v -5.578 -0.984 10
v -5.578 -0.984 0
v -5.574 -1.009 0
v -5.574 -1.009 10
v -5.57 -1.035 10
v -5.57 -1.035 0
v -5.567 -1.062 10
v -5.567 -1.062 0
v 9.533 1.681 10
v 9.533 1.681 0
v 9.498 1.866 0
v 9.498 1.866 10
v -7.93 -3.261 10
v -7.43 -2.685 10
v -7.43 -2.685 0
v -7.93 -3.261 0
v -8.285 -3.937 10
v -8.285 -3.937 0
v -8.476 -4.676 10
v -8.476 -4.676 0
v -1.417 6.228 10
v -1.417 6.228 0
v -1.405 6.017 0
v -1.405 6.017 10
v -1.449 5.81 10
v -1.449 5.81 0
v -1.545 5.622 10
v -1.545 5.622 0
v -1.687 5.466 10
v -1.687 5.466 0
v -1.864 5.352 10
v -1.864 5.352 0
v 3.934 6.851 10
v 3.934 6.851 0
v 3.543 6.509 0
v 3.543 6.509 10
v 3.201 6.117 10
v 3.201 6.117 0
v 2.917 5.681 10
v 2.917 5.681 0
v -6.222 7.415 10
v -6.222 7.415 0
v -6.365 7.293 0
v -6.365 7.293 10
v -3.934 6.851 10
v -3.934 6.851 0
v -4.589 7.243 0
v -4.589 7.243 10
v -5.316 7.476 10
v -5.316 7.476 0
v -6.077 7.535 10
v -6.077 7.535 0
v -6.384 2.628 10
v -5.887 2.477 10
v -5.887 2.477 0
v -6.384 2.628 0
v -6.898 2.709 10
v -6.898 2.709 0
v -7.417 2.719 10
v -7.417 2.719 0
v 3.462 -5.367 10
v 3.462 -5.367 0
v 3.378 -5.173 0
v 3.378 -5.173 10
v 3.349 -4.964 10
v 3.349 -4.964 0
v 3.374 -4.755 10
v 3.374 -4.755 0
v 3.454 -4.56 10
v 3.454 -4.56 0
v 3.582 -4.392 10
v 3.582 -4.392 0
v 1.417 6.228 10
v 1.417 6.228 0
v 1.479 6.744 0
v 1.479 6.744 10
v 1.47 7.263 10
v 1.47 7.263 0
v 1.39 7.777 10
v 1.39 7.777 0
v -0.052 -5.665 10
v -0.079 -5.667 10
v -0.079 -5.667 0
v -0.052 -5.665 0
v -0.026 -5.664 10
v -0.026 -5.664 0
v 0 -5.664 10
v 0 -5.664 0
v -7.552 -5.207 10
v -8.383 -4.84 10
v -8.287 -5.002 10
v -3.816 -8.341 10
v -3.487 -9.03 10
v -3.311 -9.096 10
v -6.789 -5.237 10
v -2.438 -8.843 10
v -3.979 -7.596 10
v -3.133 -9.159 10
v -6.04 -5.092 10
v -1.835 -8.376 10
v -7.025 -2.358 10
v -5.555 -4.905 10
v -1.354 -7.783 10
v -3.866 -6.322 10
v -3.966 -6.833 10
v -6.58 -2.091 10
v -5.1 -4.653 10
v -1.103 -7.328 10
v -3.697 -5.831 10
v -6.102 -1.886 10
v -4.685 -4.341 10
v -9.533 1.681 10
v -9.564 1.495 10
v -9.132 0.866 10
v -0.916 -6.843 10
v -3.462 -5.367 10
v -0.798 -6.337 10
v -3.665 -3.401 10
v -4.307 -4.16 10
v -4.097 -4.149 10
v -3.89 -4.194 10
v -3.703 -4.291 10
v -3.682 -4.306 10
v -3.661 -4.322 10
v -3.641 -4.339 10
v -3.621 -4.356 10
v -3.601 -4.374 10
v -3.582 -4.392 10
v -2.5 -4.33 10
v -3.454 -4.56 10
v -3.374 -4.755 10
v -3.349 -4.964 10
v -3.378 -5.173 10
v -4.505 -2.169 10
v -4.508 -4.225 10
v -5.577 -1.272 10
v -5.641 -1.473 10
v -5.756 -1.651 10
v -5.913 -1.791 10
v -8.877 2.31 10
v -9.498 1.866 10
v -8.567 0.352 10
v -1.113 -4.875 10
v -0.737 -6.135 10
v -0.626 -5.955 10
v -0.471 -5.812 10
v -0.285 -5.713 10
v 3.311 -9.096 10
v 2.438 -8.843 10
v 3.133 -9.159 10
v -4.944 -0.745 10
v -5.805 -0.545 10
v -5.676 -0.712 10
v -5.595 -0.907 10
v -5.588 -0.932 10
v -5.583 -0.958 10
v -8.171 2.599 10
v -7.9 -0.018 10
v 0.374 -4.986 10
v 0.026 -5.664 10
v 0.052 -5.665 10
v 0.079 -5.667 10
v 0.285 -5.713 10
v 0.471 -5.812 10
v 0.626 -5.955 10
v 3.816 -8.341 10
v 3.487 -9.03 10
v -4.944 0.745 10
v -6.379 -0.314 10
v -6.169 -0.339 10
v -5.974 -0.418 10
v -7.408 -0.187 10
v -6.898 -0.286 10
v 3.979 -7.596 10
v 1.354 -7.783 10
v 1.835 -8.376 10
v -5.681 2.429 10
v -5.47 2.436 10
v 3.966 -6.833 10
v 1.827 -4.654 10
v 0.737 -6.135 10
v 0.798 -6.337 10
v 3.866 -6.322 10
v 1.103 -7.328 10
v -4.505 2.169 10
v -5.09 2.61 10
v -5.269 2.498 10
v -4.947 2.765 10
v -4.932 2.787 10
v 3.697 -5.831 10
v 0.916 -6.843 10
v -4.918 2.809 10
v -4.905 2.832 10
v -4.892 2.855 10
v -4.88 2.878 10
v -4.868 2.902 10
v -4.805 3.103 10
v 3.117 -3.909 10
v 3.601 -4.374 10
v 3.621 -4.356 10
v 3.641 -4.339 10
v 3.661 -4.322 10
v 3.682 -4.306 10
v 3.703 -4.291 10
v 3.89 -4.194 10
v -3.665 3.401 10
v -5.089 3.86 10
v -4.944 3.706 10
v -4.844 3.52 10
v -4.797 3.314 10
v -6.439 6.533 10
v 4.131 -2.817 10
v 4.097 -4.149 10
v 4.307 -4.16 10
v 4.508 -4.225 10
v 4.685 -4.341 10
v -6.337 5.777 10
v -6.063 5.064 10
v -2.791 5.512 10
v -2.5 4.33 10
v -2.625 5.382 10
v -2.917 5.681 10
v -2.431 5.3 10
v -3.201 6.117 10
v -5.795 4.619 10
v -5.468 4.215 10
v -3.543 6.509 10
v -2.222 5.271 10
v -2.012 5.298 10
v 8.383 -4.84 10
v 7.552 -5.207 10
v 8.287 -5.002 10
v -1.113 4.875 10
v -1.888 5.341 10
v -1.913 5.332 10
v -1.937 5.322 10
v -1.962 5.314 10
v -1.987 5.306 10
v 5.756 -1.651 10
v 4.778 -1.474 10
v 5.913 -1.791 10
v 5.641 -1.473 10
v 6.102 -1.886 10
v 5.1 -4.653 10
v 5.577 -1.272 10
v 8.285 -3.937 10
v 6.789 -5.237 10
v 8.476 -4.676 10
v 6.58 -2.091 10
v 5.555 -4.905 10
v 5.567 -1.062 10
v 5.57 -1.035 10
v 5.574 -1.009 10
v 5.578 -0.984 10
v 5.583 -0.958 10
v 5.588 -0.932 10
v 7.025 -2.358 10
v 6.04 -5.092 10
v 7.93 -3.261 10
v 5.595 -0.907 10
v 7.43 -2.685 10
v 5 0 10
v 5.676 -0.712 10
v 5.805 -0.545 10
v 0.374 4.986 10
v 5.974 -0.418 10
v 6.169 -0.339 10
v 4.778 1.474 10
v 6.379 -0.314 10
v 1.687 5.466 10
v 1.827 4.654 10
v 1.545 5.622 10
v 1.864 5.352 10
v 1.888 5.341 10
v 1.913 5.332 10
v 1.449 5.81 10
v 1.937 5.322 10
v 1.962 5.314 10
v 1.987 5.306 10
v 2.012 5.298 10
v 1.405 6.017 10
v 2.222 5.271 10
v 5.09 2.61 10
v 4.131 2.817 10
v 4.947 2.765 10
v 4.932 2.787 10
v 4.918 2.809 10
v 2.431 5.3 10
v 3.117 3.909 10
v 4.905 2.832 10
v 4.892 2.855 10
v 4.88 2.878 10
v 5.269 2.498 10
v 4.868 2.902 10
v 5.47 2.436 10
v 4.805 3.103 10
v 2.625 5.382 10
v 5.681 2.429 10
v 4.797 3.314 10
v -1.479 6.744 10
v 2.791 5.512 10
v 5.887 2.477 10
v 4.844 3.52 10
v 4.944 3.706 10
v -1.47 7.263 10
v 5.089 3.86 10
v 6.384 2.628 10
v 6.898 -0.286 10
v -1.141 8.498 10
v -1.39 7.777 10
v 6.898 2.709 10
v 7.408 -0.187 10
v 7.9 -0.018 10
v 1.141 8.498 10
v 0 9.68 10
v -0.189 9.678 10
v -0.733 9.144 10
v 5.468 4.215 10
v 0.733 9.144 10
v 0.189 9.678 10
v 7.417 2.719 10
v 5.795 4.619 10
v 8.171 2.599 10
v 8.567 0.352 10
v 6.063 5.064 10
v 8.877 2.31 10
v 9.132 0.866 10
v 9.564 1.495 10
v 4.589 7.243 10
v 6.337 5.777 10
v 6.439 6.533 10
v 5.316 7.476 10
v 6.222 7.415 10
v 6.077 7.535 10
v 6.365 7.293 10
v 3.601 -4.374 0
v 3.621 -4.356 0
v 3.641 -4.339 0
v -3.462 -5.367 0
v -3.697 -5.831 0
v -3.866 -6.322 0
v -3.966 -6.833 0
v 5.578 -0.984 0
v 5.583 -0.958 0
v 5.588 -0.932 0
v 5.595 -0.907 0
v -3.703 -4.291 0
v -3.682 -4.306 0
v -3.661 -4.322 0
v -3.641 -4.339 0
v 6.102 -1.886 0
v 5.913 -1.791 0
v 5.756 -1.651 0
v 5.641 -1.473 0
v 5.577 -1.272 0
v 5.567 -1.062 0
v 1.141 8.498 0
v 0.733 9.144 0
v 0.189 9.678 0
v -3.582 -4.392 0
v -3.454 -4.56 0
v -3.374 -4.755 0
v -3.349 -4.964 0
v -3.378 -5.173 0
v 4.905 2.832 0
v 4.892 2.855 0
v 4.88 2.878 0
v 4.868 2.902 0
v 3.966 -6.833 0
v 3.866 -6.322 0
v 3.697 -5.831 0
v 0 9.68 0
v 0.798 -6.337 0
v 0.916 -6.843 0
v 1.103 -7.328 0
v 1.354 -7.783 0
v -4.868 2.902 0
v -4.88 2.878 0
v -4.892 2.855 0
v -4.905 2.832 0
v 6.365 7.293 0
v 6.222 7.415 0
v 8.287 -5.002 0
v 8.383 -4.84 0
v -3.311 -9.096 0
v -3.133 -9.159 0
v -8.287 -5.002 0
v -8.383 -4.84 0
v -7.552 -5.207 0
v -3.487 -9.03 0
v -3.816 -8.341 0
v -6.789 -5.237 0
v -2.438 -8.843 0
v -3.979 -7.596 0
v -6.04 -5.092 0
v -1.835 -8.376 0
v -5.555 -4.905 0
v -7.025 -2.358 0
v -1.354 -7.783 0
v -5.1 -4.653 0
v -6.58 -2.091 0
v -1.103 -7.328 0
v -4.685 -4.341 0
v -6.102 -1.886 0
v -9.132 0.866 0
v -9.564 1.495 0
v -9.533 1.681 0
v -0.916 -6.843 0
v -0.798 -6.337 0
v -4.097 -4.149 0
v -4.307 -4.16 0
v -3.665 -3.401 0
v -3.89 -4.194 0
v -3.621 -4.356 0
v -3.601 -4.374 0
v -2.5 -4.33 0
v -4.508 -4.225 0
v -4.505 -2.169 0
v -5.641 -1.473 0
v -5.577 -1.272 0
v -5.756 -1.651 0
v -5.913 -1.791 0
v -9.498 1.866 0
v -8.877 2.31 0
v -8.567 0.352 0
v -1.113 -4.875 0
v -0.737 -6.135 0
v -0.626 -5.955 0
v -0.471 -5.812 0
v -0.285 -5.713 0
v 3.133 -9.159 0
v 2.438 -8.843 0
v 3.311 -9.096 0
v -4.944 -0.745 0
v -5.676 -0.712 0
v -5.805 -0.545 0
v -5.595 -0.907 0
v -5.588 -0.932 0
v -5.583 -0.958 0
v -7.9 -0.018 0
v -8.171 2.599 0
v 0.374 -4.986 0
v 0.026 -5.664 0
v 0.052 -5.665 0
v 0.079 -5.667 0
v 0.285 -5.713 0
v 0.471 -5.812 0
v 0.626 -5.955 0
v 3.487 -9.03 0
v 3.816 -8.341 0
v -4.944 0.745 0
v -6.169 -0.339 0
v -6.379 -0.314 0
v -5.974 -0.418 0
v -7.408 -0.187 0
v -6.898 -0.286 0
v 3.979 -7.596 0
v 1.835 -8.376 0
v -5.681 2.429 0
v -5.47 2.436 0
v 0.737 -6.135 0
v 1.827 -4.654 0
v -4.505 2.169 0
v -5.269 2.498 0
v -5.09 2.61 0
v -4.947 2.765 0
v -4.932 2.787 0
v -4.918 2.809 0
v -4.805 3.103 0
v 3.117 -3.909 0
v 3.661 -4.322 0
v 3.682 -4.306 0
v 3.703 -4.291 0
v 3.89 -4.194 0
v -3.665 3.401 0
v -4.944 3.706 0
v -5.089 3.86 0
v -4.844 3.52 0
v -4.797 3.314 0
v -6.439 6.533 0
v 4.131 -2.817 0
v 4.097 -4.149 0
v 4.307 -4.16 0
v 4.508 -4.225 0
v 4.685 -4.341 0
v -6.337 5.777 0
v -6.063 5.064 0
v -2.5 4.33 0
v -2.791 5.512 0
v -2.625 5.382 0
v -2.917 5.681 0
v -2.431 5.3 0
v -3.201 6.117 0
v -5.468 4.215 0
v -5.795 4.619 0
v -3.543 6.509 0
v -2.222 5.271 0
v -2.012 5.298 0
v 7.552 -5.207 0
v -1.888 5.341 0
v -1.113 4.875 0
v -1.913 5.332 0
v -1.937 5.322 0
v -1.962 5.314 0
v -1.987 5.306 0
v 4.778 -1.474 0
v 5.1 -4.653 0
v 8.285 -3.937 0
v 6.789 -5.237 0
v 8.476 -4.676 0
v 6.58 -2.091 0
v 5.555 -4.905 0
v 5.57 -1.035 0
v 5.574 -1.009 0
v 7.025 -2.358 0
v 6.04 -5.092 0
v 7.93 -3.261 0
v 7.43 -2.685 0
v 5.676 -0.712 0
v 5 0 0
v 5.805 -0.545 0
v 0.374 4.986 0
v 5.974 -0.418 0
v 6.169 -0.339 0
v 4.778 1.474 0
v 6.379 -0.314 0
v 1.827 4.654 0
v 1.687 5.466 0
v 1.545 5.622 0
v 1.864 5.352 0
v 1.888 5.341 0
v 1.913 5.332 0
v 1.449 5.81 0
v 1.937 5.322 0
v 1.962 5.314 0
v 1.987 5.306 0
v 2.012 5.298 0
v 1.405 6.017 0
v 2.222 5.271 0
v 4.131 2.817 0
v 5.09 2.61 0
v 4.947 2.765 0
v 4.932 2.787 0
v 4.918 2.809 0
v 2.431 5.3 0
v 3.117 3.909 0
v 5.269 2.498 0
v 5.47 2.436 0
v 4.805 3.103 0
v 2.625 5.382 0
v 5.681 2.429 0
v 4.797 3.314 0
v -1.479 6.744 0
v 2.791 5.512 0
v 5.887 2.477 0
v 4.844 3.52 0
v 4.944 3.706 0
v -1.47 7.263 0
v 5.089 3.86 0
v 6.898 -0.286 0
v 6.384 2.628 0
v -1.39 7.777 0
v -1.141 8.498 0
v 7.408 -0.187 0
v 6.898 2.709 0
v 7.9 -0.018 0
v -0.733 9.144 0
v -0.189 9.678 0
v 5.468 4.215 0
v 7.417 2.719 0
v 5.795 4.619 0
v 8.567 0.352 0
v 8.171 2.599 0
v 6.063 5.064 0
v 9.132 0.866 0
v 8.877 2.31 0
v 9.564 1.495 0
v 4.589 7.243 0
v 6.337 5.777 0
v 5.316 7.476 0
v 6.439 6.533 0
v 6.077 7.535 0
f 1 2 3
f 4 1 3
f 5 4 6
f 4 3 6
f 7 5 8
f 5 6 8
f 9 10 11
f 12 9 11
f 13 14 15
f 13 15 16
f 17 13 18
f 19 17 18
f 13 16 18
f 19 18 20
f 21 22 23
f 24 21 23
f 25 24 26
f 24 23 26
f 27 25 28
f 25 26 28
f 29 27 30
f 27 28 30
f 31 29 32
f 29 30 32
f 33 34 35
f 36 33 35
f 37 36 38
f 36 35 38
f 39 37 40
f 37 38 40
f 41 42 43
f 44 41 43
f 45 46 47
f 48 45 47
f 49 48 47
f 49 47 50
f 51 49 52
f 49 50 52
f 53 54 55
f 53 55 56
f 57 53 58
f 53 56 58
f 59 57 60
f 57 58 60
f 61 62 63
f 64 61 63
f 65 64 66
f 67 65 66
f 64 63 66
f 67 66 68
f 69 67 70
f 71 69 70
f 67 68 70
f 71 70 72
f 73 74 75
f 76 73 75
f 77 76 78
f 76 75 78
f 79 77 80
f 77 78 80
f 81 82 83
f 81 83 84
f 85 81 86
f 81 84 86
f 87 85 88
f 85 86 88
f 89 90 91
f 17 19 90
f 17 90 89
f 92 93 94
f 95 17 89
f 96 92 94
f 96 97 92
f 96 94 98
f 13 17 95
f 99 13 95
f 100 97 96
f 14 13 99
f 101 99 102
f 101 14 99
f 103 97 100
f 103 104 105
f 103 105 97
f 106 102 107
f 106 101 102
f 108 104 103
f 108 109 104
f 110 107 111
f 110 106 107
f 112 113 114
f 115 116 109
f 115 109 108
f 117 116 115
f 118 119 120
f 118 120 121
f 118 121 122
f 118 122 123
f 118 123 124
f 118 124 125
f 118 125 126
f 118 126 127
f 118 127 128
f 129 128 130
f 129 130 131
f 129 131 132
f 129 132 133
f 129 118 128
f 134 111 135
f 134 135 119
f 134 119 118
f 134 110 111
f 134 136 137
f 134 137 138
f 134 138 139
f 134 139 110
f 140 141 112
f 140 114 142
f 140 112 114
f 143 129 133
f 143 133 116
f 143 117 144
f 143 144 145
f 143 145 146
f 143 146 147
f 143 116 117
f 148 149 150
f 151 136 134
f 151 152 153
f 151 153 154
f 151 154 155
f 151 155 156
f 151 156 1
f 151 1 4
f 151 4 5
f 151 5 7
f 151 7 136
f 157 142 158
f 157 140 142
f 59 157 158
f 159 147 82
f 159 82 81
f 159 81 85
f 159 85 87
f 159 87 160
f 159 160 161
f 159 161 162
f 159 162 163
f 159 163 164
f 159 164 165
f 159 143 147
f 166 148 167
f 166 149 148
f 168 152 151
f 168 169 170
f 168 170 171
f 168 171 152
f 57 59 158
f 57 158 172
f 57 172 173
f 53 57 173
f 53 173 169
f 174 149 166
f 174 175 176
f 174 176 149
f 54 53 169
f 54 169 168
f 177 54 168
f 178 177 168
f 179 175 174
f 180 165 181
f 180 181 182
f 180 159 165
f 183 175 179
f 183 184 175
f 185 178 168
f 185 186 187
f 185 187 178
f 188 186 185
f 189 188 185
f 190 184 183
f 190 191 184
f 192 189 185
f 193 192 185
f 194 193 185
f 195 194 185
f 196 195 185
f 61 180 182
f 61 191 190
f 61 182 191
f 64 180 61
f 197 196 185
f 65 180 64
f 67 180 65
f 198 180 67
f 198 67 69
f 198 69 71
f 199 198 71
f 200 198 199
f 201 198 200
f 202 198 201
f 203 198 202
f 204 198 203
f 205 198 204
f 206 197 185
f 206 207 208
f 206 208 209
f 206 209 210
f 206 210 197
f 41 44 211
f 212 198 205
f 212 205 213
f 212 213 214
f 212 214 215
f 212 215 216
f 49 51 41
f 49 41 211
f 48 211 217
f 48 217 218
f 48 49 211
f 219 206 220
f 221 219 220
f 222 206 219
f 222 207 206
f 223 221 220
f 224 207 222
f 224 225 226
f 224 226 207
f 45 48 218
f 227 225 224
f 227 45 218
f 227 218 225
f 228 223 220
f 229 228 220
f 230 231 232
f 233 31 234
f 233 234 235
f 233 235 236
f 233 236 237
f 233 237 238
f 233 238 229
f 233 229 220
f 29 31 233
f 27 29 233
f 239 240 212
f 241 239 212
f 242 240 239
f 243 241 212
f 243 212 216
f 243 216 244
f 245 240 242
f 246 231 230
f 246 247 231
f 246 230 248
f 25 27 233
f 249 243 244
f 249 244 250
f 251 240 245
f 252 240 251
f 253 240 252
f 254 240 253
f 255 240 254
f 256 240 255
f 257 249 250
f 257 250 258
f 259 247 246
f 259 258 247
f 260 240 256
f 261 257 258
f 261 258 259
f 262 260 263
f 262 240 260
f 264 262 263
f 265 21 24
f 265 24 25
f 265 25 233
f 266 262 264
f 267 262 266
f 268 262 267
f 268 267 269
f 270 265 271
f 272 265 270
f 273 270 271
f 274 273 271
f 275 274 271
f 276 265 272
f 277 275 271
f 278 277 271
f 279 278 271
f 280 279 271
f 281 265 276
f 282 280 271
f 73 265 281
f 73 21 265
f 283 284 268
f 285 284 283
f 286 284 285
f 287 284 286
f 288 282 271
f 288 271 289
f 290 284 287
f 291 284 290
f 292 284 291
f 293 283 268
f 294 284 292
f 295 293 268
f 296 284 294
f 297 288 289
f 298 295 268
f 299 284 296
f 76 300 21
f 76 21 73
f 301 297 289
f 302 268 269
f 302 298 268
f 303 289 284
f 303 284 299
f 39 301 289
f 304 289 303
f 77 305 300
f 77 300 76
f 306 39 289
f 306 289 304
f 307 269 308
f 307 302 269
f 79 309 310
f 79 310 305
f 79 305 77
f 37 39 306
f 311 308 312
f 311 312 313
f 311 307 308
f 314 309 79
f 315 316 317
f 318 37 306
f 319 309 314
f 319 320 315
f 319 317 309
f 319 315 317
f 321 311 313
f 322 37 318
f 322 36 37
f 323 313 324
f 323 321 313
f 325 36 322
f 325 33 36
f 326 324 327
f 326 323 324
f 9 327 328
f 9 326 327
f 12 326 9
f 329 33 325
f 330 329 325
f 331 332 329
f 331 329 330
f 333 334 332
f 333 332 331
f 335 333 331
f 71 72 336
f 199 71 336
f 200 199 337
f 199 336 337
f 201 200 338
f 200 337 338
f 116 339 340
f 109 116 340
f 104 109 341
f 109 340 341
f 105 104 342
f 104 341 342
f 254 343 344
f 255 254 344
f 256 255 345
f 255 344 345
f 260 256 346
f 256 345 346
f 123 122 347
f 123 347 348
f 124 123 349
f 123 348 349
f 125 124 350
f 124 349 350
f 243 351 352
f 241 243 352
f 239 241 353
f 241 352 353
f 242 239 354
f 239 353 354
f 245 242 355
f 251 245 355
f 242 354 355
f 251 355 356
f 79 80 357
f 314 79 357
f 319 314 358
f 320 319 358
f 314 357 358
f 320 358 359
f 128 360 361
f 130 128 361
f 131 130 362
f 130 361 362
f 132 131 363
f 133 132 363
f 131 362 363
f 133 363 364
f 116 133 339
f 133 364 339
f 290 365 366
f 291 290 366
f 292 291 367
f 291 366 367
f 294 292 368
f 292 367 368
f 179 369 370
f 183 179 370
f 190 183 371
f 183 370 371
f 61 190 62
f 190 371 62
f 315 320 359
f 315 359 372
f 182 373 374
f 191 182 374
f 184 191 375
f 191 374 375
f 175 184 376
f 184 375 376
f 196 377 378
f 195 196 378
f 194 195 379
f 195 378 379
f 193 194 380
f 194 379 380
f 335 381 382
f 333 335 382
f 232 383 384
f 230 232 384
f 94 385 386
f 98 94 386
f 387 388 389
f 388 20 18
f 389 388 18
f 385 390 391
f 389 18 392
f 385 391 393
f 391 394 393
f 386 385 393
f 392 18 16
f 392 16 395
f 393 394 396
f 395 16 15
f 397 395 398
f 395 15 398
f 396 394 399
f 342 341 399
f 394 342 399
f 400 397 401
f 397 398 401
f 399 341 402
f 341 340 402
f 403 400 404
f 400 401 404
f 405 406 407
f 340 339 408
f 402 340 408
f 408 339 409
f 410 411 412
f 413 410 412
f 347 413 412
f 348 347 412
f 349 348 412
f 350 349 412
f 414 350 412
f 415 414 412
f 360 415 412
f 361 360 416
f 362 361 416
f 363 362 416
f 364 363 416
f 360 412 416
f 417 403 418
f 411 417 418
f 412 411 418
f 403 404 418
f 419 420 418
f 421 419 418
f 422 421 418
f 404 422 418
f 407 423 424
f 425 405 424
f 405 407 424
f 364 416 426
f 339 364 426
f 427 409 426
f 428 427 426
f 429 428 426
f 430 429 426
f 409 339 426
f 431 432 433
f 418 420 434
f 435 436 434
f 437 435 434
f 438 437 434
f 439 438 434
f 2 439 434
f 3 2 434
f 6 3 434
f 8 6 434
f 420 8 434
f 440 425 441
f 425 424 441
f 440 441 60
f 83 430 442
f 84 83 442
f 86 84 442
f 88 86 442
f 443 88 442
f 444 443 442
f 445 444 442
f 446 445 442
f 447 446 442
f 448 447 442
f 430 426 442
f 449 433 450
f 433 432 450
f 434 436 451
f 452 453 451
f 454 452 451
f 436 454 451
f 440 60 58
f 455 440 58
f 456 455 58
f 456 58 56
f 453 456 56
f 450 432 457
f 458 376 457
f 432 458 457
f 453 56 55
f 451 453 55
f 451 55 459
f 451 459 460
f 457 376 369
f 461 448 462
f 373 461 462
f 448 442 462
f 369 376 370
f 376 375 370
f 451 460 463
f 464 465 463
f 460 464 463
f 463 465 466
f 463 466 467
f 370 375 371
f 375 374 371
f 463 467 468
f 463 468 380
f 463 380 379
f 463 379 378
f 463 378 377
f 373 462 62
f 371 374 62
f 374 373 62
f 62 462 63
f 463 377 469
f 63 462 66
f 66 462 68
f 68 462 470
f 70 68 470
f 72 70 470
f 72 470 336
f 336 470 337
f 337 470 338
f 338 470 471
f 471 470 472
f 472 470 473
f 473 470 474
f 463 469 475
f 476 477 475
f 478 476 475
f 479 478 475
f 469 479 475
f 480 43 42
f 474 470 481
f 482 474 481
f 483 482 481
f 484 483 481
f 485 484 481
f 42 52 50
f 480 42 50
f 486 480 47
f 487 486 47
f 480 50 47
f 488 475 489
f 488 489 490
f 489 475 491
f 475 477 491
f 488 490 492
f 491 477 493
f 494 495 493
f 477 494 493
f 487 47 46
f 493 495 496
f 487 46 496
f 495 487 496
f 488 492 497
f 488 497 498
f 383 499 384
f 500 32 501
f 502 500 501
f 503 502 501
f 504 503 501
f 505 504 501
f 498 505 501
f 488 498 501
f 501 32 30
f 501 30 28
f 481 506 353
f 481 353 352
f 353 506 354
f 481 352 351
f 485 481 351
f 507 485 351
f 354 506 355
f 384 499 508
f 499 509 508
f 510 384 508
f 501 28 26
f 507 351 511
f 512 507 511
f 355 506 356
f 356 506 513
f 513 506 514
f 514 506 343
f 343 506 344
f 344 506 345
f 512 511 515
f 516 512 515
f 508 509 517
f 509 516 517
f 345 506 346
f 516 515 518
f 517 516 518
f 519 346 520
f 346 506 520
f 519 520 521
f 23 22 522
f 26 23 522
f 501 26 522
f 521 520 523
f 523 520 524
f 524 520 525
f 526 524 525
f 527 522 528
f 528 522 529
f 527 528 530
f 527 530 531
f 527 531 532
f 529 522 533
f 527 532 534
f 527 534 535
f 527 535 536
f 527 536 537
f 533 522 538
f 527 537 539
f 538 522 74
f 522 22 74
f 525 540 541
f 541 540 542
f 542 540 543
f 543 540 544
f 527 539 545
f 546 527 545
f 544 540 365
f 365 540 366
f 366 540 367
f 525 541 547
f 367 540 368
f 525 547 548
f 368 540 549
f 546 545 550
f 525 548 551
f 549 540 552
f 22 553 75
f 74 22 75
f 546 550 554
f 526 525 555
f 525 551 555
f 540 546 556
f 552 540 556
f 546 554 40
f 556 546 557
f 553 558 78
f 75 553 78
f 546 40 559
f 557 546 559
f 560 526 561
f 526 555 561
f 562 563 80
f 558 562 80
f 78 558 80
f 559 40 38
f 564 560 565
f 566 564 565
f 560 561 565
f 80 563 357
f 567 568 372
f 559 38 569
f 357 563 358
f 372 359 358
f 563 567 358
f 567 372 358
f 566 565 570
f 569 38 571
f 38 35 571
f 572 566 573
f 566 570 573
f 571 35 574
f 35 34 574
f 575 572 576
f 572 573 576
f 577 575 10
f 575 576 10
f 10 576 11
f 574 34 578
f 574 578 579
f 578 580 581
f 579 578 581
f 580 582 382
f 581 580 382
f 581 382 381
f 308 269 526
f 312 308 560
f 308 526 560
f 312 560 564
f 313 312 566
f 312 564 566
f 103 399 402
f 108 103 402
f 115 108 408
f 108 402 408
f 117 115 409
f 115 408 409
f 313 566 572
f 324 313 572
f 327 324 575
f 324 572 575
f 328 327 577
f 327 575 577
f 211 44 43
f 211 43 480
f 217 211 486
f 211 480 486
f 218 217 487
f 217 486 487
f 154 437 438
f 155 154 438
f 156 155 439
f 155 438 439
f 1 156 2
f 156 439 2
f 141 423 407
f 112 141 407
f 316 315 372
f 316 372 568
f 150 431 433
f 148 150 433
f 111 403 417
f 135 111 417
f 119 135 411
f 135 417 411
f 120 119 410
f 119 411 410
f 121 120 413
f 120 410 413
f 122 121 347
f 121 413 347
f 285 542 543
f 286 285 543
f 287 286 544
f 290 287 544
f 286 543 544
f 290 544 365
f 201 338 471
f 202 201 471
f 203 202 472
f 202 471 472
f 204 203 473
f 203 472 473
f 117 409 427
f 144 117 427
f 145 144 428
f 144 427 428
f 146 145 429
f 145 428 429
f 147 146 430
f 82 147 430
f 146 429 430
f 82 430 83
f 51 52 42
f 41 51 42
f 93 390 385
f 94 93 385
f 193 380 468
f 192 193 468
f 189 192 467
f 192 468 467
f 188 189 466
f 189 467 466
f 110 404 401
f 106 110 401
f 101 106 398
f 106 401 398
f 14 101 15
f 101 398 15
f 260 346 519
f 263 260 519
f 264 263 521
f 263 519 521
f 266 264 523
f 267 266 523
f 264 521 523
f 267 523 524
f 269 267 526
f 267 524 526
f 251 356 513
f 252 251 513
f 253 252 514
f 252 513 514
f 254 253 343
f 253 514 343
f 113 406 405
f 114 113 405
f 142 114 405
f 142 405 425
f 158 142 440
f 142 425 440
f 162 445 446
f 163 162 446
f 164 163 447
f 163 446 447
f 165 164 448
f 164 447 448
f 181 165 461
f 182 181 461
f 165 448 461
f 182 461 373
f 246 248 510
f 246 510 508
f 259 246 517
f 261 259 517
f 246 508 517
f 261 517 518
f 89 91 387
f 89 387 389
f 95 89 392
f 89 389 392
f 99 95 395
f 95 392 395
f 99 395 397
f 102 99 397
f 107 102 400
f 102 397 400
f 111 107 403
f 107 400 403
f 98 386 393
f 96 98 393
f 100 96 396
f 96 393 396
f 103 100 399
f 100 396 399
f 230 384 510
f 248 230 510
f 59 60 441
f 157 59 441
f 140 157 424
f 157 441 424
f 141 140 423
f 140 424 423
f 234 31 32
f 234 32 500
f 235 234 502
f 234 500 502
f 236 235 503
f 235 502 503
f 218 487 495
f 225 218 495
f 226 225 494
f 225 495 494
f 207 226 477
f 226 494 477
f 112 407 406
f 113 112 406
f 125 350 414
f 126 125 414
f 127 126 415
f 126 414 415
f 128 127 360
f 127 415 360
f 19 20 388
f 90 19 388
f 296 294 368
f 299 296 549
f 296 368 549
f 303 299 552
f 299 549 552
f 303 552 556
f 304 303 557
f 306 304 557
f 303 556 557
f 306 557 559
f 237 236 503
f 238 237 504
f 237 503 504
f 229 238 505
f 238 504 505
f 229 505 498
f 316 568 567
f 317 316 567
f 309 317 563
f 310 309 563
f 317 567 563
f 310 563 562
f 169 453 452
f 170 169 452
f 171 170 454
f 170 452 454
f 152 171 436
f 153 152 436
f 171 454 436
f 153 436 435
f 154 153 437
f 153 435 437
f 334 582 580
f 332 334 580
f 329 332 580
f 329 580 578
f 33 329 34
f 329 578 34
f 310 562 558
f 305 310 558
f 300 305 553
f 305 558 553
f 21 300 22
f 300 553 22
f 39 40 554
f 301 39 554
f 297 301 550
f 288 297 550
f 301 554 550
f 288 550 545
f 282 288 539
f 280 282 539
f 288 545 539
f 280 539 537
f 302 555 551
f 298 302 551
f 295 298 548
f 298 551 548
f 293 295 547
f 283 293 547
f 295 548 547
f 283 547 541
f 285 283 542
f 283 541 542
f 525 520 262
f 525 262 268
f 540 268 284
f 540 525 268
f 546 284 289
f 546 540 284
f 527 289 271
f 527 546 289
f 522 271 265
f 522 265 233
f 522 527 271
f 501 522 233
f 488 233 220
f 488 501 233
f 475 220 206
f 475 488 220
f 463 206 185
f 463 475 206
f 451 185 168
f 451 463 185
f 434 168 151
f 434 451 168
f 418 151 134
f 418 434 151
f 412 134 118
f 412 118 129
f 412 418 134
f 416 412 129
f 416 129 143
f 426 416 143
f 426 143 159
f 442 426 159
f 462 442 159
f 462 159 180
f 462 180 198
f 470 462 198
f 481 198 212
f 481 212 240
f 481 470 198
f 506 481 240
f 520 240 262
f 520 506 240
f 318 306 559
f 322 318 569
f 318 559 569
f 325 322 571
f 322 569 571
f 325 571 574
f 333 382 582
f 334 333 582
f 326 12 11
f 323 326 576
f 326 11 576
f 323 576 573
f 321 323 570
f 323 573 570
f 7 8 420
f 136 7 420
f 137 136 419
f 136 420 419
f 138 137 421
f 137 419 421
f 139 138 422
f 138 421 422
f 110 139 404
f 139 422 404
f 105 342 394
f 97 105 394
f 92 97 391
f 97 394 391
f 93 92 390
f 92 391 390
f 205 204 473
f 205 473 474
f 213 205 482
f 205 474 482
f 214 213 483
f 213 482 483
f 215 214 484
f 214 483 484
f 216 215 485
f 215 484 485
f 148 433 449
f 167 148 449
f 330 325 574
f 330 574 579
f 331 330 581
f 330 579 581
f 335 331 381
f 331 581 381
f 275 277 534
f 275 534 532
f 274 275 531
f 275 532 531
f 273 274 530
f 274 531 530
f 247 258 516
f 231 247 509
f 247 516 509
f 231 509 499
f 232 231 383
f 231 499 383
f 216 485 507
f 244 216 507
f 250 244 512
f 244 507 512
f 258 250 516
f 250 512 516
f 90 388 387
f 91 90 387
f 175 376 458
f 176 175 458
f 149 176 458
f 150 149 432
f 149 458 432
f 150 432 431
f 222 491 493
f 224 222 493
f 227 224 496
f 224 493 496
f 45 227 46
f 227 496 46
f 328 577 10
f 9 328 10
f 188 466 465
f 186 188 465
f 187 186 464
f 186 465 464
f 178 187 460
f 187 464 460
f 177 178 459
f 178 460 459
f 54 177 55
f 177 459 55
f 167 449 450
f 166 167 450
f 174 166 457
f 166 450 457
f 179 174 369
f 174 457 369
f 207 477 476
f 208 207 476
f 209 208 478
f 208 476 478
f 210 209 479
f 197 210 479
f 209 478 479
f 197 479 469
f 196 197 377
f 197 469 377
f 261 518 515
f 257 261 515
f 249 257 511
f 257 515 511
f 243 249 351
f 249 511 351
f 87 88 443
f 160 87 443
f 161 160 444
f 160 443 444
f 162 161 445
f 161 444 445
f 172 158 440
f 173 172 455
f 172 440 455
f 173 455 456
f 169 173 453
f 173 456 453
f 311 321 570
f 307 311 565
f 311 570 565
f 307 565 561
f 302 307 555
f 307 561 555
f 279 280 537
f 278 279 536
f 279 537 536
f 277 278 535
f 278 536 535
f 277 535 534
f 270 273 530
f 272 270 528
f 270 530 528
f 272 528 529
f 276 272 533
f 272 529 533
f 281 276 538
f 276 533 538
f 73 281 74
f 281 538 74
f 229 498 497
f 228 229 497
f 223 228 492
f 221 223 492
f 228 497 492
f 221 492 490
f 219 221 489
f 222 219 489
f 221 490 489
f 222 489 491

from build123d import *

# Parameters (mm, degrees)
F0_R     = 5
F1_DEPTH = 10


with BuildPart() as f1:
    # F0 (on Top) → F1 (new body)
    with BuildSketch(Plane.XY):
        with BuildLine():
            ThreePointArc((1.864316, 5.3522), (1.490455, 5.713083), (1.417156, 6.227511))
            ThreePointArc((1.417156, 6.227511), (1.483836, 7.003606), (1.389552, 7.776834))
            ThreePointArc((1.389552, 7.776834), (0.955753, 8.832789), (0.188574, 9.678163))
            Line((0.188574, 9.678163), (0, 9.68))
            Line((0, 9.68), (-0.188574, 9.678163))
            ThreePointArc((-0.188574, 9.678163), (-0.955753, 8.832789), (-1.389552, 7.776834))
            ThreePointArc((-1.389552, 7.776834), (-1.483836, 7.003606), (-1.417156, 6.227511))
            ThreePointArc((-1.417156, 6.227511), (-1.490455, 5.713083), (-1.864316, 5.3522))
            ThreePointArc((-1.864316, 5.3522), (-1.900395, 5.336418), (-1.937206, 5.32243))
            ThreePointArc((-1.937206, 5.32243), (-1.974396, 5.309483), (-2.012179, 5.298382))
            ThreePointArc((-2.012179, 5.298382), (-2.530544, 5.334521), (-2.917363, 5.68148))
            ThreePointArc((-2.917363, 5.68148), (-3.365147, 6.318865), (-3.934394, 6.850587))
            ThreePointArc((-3.934394, 6.850587), (-4.945458, 7.380655), (-6.076547, 7.535116))
            Line((-6.076547, 7.535116), (-6.222184, 7.41531))
            Line((-6.222184, 7.41531), (-6.365459, 7.29269))
            ThreePointArc((-6.365459, 7.29269), (-6.409757, 6.151962), (-6.063311, 5.064213))
            ThreePointArc((-6.063311, 5.064213), (-5.638516, 4.411282), (-5.088571, 3.85962))
            ThreePointArc((-5.088571, 3.85962), (-4.814053, 3.418429), (-4.868477, 2.901664))
            ThreePointArc((-4.868477, 2.901664), (-4.88597, 2.866383), (-4.905178, 2.832006))
            ThreePointArc((-4.905178, 2.832006), (-4.925345, 2.798183), (-4.947153, 2.765393))
            ThreePointArc((-4.947153, 2.765393), (-5.367473, 2.459878), (-5.886814, 2.477022))
            ThreePointArc((-5.886814, 2.477022), (-6.63954, 2.677457), (-7.417393, 2.718875))
            ThreePointArc((-7.417393, 2.718875), (-8.532634, 2.475031), (-9.498384, 1.866304))
            Line((-9.498384, 1.866304), (-9.532939, 1.680914))
            Line((-9.532939, 1.680914), (-9.563876, 1.494886))
            ThreePointArc((-9.563876, 1.494886), (-8.864564, 0.592564), (-7.899979, -0.018009))
            ThreePointArc((-7.899979, -0.018009), (-7.154871, -0.24513), (-6.378987, -0.31423))
            ThreePointArc((-6.378987, -0.31423), (-5.885103, -0.475745), (-5.594623, -0.906593))
            ThreePointArc((-5.594623, -0.906593), (-5.585346, -0.944864), (-5.577963, -0.983545))
            ThreePointArc((-5.577963, -0.983545), (-5.571671, -1.022419), (-5.567299, -1.061555))
            ThreePointArc((-5.567299, -1.061555), (-5.692902, -1.56577), (-6.10176, -1.886463))
            ThreePointArc((-6.10176, -1.886463), (-6.807219, -2.216763), (-7.429712, -2.685029))
            ThreePointArc((-7.429712, -2.685029), (-8.127296, -3.588688), (-8.475822, -4.675772))
            Line((-8.475822, -4.675772), (-8.383126, -4.84))
            Line((-8.383126, -4.84), (-8.287248, -5.002391))
            ThreePointArc((-8.287248, -5.002391), (-7.171543, -5.244101), (-6.04016, -5.091804))
            ThreePointArc((-6.04016, -5.091804), (-5.323383, -4.786843), (-4.684605, -4.341048))
            ThreePointArc((-4.684605, -4.341048), (-4.202447, -4.147313), (-3.702983, -4.290645))
            ThreePointArc((-3.702983, -4.290645), (-3.671276, -4.313999), (-3.640757, -4.338885))
            ThreePointArc((-3.640757, -4.338885), (-3.610949, -4.364619), (-3.582444, -4.391789))
            ThreePointArc((-3.582444, -4.391789), (-3.354559, -4.858776), (-3.461625, -5.36725))
            ThreePointArc((-3.461625, -5.36725), (-3.789724, -6.073735), (-3.965586, -6.832579))
            ThreePointArc((-3.965586, -6.832579), (-3.919106, -7.973219), (-3.487328, -9.030002))
            Line((-3.487328, -9.030002), (-3.310755, -9.096225))
            Line((-3.310755, -9.096225), (-3.132925, -9.158994))
            ThreePointArc((-3.132925, -9.158994), (-2.122877, -8.626993), (-1.354082, -7.783088))
            ThreePointArc((-1.354082, -7.783088), (-1.001025, -7.088739), (-0.798243, -6.336642))
            ThreePointArc((-0.798243, -6.336642), (-0.55342, -5.878307), (-0.078676, -5.667056))
            ThreePointArc((-0.078676, -5.667056), (-0.039376, -5.664566), (0, -5.664012))
            ThreePointArc((0, -5.664012), (0.039376, -5.664566), (0.078676, -5.667056))
            ThreePointArc((0.078676, -5.667056), (0.55342, -5.878307), (0.798243, -6.336642))
            ThreePointArc((0.798243, -6.336642), (1.001025, -7.088739), (1.354082, -7.783088))
            ThreePointArc((1.354082, -7.783088), (2.122877, -8.626993), (3.132925, -9.158994))
            Line((3.132925, -9.158994), (3.310755, -9.096225))
            Line((3.310755, -9.096225), (3.487328, -9.030002))
            ThreePointArc((3.487328, -9.030002), (3.919106, -7.973219), (3.965586, -6.832579))
            ThreePointArc((3.965586, -6.832579), (3.789724, -6.073735), (3.461625, -5.36725))
            ThreePointArc((3.461625, -5.36725), (3.354559, -4.858776), (3.582444, -4.391789))
            ThreePointArc((3.582444, -4.391789), (3.610949, -4.364619), (3.640757, -4.338885))
            ThreePointArc((3.640757, -4.338885), (3.671276, -4.313999), (3.702983, -4.290645))
            ThreePointArc((3.702983, -4.290645), (4.202447, -4.147313), (4.684605, -4.341048))
            ThreePointArc((4.684605, -4.341048), (5.323383, -4.786843), (6.04016, -5.091804))
            ThreePointArc((6.04016, -5.091804), (7.171543, -5.244101), (8.287248, -5.002391))
            Line((8.287248, -5.002391), (8.383126, -4.84))
            Line((8.383126, -4.84), (8.475822, -4.675772))
            ThreePointArc((8.475822, -4.675772), (8.127296, -3.588688), (7.429712, -2.685029))
            ThreePointArc((7.429712, -2.685029), (6.807219, -2.216763), (6.10176, -1.886463))
            ThreePointArc((6.10176, -1.886463), (5.692902, -1.56577), (5.567299, -1.061555))
            ThreePointArc((5.567299, -1.061555), (5.571671, -1.022419), (5.577963, -0.983545))
            ThreePointArc((5.577963, -0.983545), (5.585346, -0.944864), (5.594623, -0.906593))
            ThreePointArc((5.594623, -0.906593), (5.885103, -0.475745), (6.378987, -0.31423))
            ThreePointArc((6.378987, -0.31423), (7.154871, -0.24513), (7.899979, -0.018009))
            ThreePointArc((7.899979, -0.018009), (8.864564, 0.592564), (9.563876, 1.494886))
            Line((9.563876, 1.494886), (9.532939, 1.680914))
            Line((9.532939, 1.680914), (9.498384, 1.866304))
            ThreePointArc((9.498384, 1.866304), (8.532634, 2.475031), (7.417393, 2.718875))
            ThreePointArc((7.417393, 2.718875), (6.63954, 2.677457), (5.886814, 2.477022))
            ThreePointArc((5.886814, 2.477022), (5.367473, 2.459878), (4.947153, 2.765393))
            ThreePointArc((4.947153, 2.765393), (4.925345, 2.798183), (4.905178, 2.832006))
            ThreePointArc((4.905178, 2.832006), (4.88597, 2.866383), (4.868477, 2.901664))
            ThreePointArc((4.868477, 2.901664), (4.814053, 3.418429), (5.088571, 3.85962))
            ThreePointArc((5.088571, 3.85962), (5.638516, 4.411282), (6.063311, 5.064213))
            ThreePointArc((6.063311, 5.064213), (6.409757, 6.151962), (6.365459, 7.29269))
            Line((6.365459, 7.29269), (6.222184, 7.41531))
            Line((6.222184, 7.41531), (6.076547, 7.535116))
            ThreePointArc((6.076547, 7.535116), (4.945458, 7.380655), (3.934394, 6.850587))
            ThreePointArc((3.934394, 6.850587), (3.365147, 6.318865), (2.917363, 5.68148))
            ThreePointArc((2.917363, 5.68148), (2.530544, 5.334521), (2.012179, 5.298382))
            ThreePointArc((2.012179, 5.298382), (1.974396, 5.309483), (1.937206, 5.32243))
            ThreePointArc((1.937206, 5.32243), (1.900395, 5.336418), (1.864316, 5.3522))
        make_face()
        Circle(F0_R, mode=Mode.SUBTRACT)
    extrude(amount=F1_DEPTH)


solid = f1.part
